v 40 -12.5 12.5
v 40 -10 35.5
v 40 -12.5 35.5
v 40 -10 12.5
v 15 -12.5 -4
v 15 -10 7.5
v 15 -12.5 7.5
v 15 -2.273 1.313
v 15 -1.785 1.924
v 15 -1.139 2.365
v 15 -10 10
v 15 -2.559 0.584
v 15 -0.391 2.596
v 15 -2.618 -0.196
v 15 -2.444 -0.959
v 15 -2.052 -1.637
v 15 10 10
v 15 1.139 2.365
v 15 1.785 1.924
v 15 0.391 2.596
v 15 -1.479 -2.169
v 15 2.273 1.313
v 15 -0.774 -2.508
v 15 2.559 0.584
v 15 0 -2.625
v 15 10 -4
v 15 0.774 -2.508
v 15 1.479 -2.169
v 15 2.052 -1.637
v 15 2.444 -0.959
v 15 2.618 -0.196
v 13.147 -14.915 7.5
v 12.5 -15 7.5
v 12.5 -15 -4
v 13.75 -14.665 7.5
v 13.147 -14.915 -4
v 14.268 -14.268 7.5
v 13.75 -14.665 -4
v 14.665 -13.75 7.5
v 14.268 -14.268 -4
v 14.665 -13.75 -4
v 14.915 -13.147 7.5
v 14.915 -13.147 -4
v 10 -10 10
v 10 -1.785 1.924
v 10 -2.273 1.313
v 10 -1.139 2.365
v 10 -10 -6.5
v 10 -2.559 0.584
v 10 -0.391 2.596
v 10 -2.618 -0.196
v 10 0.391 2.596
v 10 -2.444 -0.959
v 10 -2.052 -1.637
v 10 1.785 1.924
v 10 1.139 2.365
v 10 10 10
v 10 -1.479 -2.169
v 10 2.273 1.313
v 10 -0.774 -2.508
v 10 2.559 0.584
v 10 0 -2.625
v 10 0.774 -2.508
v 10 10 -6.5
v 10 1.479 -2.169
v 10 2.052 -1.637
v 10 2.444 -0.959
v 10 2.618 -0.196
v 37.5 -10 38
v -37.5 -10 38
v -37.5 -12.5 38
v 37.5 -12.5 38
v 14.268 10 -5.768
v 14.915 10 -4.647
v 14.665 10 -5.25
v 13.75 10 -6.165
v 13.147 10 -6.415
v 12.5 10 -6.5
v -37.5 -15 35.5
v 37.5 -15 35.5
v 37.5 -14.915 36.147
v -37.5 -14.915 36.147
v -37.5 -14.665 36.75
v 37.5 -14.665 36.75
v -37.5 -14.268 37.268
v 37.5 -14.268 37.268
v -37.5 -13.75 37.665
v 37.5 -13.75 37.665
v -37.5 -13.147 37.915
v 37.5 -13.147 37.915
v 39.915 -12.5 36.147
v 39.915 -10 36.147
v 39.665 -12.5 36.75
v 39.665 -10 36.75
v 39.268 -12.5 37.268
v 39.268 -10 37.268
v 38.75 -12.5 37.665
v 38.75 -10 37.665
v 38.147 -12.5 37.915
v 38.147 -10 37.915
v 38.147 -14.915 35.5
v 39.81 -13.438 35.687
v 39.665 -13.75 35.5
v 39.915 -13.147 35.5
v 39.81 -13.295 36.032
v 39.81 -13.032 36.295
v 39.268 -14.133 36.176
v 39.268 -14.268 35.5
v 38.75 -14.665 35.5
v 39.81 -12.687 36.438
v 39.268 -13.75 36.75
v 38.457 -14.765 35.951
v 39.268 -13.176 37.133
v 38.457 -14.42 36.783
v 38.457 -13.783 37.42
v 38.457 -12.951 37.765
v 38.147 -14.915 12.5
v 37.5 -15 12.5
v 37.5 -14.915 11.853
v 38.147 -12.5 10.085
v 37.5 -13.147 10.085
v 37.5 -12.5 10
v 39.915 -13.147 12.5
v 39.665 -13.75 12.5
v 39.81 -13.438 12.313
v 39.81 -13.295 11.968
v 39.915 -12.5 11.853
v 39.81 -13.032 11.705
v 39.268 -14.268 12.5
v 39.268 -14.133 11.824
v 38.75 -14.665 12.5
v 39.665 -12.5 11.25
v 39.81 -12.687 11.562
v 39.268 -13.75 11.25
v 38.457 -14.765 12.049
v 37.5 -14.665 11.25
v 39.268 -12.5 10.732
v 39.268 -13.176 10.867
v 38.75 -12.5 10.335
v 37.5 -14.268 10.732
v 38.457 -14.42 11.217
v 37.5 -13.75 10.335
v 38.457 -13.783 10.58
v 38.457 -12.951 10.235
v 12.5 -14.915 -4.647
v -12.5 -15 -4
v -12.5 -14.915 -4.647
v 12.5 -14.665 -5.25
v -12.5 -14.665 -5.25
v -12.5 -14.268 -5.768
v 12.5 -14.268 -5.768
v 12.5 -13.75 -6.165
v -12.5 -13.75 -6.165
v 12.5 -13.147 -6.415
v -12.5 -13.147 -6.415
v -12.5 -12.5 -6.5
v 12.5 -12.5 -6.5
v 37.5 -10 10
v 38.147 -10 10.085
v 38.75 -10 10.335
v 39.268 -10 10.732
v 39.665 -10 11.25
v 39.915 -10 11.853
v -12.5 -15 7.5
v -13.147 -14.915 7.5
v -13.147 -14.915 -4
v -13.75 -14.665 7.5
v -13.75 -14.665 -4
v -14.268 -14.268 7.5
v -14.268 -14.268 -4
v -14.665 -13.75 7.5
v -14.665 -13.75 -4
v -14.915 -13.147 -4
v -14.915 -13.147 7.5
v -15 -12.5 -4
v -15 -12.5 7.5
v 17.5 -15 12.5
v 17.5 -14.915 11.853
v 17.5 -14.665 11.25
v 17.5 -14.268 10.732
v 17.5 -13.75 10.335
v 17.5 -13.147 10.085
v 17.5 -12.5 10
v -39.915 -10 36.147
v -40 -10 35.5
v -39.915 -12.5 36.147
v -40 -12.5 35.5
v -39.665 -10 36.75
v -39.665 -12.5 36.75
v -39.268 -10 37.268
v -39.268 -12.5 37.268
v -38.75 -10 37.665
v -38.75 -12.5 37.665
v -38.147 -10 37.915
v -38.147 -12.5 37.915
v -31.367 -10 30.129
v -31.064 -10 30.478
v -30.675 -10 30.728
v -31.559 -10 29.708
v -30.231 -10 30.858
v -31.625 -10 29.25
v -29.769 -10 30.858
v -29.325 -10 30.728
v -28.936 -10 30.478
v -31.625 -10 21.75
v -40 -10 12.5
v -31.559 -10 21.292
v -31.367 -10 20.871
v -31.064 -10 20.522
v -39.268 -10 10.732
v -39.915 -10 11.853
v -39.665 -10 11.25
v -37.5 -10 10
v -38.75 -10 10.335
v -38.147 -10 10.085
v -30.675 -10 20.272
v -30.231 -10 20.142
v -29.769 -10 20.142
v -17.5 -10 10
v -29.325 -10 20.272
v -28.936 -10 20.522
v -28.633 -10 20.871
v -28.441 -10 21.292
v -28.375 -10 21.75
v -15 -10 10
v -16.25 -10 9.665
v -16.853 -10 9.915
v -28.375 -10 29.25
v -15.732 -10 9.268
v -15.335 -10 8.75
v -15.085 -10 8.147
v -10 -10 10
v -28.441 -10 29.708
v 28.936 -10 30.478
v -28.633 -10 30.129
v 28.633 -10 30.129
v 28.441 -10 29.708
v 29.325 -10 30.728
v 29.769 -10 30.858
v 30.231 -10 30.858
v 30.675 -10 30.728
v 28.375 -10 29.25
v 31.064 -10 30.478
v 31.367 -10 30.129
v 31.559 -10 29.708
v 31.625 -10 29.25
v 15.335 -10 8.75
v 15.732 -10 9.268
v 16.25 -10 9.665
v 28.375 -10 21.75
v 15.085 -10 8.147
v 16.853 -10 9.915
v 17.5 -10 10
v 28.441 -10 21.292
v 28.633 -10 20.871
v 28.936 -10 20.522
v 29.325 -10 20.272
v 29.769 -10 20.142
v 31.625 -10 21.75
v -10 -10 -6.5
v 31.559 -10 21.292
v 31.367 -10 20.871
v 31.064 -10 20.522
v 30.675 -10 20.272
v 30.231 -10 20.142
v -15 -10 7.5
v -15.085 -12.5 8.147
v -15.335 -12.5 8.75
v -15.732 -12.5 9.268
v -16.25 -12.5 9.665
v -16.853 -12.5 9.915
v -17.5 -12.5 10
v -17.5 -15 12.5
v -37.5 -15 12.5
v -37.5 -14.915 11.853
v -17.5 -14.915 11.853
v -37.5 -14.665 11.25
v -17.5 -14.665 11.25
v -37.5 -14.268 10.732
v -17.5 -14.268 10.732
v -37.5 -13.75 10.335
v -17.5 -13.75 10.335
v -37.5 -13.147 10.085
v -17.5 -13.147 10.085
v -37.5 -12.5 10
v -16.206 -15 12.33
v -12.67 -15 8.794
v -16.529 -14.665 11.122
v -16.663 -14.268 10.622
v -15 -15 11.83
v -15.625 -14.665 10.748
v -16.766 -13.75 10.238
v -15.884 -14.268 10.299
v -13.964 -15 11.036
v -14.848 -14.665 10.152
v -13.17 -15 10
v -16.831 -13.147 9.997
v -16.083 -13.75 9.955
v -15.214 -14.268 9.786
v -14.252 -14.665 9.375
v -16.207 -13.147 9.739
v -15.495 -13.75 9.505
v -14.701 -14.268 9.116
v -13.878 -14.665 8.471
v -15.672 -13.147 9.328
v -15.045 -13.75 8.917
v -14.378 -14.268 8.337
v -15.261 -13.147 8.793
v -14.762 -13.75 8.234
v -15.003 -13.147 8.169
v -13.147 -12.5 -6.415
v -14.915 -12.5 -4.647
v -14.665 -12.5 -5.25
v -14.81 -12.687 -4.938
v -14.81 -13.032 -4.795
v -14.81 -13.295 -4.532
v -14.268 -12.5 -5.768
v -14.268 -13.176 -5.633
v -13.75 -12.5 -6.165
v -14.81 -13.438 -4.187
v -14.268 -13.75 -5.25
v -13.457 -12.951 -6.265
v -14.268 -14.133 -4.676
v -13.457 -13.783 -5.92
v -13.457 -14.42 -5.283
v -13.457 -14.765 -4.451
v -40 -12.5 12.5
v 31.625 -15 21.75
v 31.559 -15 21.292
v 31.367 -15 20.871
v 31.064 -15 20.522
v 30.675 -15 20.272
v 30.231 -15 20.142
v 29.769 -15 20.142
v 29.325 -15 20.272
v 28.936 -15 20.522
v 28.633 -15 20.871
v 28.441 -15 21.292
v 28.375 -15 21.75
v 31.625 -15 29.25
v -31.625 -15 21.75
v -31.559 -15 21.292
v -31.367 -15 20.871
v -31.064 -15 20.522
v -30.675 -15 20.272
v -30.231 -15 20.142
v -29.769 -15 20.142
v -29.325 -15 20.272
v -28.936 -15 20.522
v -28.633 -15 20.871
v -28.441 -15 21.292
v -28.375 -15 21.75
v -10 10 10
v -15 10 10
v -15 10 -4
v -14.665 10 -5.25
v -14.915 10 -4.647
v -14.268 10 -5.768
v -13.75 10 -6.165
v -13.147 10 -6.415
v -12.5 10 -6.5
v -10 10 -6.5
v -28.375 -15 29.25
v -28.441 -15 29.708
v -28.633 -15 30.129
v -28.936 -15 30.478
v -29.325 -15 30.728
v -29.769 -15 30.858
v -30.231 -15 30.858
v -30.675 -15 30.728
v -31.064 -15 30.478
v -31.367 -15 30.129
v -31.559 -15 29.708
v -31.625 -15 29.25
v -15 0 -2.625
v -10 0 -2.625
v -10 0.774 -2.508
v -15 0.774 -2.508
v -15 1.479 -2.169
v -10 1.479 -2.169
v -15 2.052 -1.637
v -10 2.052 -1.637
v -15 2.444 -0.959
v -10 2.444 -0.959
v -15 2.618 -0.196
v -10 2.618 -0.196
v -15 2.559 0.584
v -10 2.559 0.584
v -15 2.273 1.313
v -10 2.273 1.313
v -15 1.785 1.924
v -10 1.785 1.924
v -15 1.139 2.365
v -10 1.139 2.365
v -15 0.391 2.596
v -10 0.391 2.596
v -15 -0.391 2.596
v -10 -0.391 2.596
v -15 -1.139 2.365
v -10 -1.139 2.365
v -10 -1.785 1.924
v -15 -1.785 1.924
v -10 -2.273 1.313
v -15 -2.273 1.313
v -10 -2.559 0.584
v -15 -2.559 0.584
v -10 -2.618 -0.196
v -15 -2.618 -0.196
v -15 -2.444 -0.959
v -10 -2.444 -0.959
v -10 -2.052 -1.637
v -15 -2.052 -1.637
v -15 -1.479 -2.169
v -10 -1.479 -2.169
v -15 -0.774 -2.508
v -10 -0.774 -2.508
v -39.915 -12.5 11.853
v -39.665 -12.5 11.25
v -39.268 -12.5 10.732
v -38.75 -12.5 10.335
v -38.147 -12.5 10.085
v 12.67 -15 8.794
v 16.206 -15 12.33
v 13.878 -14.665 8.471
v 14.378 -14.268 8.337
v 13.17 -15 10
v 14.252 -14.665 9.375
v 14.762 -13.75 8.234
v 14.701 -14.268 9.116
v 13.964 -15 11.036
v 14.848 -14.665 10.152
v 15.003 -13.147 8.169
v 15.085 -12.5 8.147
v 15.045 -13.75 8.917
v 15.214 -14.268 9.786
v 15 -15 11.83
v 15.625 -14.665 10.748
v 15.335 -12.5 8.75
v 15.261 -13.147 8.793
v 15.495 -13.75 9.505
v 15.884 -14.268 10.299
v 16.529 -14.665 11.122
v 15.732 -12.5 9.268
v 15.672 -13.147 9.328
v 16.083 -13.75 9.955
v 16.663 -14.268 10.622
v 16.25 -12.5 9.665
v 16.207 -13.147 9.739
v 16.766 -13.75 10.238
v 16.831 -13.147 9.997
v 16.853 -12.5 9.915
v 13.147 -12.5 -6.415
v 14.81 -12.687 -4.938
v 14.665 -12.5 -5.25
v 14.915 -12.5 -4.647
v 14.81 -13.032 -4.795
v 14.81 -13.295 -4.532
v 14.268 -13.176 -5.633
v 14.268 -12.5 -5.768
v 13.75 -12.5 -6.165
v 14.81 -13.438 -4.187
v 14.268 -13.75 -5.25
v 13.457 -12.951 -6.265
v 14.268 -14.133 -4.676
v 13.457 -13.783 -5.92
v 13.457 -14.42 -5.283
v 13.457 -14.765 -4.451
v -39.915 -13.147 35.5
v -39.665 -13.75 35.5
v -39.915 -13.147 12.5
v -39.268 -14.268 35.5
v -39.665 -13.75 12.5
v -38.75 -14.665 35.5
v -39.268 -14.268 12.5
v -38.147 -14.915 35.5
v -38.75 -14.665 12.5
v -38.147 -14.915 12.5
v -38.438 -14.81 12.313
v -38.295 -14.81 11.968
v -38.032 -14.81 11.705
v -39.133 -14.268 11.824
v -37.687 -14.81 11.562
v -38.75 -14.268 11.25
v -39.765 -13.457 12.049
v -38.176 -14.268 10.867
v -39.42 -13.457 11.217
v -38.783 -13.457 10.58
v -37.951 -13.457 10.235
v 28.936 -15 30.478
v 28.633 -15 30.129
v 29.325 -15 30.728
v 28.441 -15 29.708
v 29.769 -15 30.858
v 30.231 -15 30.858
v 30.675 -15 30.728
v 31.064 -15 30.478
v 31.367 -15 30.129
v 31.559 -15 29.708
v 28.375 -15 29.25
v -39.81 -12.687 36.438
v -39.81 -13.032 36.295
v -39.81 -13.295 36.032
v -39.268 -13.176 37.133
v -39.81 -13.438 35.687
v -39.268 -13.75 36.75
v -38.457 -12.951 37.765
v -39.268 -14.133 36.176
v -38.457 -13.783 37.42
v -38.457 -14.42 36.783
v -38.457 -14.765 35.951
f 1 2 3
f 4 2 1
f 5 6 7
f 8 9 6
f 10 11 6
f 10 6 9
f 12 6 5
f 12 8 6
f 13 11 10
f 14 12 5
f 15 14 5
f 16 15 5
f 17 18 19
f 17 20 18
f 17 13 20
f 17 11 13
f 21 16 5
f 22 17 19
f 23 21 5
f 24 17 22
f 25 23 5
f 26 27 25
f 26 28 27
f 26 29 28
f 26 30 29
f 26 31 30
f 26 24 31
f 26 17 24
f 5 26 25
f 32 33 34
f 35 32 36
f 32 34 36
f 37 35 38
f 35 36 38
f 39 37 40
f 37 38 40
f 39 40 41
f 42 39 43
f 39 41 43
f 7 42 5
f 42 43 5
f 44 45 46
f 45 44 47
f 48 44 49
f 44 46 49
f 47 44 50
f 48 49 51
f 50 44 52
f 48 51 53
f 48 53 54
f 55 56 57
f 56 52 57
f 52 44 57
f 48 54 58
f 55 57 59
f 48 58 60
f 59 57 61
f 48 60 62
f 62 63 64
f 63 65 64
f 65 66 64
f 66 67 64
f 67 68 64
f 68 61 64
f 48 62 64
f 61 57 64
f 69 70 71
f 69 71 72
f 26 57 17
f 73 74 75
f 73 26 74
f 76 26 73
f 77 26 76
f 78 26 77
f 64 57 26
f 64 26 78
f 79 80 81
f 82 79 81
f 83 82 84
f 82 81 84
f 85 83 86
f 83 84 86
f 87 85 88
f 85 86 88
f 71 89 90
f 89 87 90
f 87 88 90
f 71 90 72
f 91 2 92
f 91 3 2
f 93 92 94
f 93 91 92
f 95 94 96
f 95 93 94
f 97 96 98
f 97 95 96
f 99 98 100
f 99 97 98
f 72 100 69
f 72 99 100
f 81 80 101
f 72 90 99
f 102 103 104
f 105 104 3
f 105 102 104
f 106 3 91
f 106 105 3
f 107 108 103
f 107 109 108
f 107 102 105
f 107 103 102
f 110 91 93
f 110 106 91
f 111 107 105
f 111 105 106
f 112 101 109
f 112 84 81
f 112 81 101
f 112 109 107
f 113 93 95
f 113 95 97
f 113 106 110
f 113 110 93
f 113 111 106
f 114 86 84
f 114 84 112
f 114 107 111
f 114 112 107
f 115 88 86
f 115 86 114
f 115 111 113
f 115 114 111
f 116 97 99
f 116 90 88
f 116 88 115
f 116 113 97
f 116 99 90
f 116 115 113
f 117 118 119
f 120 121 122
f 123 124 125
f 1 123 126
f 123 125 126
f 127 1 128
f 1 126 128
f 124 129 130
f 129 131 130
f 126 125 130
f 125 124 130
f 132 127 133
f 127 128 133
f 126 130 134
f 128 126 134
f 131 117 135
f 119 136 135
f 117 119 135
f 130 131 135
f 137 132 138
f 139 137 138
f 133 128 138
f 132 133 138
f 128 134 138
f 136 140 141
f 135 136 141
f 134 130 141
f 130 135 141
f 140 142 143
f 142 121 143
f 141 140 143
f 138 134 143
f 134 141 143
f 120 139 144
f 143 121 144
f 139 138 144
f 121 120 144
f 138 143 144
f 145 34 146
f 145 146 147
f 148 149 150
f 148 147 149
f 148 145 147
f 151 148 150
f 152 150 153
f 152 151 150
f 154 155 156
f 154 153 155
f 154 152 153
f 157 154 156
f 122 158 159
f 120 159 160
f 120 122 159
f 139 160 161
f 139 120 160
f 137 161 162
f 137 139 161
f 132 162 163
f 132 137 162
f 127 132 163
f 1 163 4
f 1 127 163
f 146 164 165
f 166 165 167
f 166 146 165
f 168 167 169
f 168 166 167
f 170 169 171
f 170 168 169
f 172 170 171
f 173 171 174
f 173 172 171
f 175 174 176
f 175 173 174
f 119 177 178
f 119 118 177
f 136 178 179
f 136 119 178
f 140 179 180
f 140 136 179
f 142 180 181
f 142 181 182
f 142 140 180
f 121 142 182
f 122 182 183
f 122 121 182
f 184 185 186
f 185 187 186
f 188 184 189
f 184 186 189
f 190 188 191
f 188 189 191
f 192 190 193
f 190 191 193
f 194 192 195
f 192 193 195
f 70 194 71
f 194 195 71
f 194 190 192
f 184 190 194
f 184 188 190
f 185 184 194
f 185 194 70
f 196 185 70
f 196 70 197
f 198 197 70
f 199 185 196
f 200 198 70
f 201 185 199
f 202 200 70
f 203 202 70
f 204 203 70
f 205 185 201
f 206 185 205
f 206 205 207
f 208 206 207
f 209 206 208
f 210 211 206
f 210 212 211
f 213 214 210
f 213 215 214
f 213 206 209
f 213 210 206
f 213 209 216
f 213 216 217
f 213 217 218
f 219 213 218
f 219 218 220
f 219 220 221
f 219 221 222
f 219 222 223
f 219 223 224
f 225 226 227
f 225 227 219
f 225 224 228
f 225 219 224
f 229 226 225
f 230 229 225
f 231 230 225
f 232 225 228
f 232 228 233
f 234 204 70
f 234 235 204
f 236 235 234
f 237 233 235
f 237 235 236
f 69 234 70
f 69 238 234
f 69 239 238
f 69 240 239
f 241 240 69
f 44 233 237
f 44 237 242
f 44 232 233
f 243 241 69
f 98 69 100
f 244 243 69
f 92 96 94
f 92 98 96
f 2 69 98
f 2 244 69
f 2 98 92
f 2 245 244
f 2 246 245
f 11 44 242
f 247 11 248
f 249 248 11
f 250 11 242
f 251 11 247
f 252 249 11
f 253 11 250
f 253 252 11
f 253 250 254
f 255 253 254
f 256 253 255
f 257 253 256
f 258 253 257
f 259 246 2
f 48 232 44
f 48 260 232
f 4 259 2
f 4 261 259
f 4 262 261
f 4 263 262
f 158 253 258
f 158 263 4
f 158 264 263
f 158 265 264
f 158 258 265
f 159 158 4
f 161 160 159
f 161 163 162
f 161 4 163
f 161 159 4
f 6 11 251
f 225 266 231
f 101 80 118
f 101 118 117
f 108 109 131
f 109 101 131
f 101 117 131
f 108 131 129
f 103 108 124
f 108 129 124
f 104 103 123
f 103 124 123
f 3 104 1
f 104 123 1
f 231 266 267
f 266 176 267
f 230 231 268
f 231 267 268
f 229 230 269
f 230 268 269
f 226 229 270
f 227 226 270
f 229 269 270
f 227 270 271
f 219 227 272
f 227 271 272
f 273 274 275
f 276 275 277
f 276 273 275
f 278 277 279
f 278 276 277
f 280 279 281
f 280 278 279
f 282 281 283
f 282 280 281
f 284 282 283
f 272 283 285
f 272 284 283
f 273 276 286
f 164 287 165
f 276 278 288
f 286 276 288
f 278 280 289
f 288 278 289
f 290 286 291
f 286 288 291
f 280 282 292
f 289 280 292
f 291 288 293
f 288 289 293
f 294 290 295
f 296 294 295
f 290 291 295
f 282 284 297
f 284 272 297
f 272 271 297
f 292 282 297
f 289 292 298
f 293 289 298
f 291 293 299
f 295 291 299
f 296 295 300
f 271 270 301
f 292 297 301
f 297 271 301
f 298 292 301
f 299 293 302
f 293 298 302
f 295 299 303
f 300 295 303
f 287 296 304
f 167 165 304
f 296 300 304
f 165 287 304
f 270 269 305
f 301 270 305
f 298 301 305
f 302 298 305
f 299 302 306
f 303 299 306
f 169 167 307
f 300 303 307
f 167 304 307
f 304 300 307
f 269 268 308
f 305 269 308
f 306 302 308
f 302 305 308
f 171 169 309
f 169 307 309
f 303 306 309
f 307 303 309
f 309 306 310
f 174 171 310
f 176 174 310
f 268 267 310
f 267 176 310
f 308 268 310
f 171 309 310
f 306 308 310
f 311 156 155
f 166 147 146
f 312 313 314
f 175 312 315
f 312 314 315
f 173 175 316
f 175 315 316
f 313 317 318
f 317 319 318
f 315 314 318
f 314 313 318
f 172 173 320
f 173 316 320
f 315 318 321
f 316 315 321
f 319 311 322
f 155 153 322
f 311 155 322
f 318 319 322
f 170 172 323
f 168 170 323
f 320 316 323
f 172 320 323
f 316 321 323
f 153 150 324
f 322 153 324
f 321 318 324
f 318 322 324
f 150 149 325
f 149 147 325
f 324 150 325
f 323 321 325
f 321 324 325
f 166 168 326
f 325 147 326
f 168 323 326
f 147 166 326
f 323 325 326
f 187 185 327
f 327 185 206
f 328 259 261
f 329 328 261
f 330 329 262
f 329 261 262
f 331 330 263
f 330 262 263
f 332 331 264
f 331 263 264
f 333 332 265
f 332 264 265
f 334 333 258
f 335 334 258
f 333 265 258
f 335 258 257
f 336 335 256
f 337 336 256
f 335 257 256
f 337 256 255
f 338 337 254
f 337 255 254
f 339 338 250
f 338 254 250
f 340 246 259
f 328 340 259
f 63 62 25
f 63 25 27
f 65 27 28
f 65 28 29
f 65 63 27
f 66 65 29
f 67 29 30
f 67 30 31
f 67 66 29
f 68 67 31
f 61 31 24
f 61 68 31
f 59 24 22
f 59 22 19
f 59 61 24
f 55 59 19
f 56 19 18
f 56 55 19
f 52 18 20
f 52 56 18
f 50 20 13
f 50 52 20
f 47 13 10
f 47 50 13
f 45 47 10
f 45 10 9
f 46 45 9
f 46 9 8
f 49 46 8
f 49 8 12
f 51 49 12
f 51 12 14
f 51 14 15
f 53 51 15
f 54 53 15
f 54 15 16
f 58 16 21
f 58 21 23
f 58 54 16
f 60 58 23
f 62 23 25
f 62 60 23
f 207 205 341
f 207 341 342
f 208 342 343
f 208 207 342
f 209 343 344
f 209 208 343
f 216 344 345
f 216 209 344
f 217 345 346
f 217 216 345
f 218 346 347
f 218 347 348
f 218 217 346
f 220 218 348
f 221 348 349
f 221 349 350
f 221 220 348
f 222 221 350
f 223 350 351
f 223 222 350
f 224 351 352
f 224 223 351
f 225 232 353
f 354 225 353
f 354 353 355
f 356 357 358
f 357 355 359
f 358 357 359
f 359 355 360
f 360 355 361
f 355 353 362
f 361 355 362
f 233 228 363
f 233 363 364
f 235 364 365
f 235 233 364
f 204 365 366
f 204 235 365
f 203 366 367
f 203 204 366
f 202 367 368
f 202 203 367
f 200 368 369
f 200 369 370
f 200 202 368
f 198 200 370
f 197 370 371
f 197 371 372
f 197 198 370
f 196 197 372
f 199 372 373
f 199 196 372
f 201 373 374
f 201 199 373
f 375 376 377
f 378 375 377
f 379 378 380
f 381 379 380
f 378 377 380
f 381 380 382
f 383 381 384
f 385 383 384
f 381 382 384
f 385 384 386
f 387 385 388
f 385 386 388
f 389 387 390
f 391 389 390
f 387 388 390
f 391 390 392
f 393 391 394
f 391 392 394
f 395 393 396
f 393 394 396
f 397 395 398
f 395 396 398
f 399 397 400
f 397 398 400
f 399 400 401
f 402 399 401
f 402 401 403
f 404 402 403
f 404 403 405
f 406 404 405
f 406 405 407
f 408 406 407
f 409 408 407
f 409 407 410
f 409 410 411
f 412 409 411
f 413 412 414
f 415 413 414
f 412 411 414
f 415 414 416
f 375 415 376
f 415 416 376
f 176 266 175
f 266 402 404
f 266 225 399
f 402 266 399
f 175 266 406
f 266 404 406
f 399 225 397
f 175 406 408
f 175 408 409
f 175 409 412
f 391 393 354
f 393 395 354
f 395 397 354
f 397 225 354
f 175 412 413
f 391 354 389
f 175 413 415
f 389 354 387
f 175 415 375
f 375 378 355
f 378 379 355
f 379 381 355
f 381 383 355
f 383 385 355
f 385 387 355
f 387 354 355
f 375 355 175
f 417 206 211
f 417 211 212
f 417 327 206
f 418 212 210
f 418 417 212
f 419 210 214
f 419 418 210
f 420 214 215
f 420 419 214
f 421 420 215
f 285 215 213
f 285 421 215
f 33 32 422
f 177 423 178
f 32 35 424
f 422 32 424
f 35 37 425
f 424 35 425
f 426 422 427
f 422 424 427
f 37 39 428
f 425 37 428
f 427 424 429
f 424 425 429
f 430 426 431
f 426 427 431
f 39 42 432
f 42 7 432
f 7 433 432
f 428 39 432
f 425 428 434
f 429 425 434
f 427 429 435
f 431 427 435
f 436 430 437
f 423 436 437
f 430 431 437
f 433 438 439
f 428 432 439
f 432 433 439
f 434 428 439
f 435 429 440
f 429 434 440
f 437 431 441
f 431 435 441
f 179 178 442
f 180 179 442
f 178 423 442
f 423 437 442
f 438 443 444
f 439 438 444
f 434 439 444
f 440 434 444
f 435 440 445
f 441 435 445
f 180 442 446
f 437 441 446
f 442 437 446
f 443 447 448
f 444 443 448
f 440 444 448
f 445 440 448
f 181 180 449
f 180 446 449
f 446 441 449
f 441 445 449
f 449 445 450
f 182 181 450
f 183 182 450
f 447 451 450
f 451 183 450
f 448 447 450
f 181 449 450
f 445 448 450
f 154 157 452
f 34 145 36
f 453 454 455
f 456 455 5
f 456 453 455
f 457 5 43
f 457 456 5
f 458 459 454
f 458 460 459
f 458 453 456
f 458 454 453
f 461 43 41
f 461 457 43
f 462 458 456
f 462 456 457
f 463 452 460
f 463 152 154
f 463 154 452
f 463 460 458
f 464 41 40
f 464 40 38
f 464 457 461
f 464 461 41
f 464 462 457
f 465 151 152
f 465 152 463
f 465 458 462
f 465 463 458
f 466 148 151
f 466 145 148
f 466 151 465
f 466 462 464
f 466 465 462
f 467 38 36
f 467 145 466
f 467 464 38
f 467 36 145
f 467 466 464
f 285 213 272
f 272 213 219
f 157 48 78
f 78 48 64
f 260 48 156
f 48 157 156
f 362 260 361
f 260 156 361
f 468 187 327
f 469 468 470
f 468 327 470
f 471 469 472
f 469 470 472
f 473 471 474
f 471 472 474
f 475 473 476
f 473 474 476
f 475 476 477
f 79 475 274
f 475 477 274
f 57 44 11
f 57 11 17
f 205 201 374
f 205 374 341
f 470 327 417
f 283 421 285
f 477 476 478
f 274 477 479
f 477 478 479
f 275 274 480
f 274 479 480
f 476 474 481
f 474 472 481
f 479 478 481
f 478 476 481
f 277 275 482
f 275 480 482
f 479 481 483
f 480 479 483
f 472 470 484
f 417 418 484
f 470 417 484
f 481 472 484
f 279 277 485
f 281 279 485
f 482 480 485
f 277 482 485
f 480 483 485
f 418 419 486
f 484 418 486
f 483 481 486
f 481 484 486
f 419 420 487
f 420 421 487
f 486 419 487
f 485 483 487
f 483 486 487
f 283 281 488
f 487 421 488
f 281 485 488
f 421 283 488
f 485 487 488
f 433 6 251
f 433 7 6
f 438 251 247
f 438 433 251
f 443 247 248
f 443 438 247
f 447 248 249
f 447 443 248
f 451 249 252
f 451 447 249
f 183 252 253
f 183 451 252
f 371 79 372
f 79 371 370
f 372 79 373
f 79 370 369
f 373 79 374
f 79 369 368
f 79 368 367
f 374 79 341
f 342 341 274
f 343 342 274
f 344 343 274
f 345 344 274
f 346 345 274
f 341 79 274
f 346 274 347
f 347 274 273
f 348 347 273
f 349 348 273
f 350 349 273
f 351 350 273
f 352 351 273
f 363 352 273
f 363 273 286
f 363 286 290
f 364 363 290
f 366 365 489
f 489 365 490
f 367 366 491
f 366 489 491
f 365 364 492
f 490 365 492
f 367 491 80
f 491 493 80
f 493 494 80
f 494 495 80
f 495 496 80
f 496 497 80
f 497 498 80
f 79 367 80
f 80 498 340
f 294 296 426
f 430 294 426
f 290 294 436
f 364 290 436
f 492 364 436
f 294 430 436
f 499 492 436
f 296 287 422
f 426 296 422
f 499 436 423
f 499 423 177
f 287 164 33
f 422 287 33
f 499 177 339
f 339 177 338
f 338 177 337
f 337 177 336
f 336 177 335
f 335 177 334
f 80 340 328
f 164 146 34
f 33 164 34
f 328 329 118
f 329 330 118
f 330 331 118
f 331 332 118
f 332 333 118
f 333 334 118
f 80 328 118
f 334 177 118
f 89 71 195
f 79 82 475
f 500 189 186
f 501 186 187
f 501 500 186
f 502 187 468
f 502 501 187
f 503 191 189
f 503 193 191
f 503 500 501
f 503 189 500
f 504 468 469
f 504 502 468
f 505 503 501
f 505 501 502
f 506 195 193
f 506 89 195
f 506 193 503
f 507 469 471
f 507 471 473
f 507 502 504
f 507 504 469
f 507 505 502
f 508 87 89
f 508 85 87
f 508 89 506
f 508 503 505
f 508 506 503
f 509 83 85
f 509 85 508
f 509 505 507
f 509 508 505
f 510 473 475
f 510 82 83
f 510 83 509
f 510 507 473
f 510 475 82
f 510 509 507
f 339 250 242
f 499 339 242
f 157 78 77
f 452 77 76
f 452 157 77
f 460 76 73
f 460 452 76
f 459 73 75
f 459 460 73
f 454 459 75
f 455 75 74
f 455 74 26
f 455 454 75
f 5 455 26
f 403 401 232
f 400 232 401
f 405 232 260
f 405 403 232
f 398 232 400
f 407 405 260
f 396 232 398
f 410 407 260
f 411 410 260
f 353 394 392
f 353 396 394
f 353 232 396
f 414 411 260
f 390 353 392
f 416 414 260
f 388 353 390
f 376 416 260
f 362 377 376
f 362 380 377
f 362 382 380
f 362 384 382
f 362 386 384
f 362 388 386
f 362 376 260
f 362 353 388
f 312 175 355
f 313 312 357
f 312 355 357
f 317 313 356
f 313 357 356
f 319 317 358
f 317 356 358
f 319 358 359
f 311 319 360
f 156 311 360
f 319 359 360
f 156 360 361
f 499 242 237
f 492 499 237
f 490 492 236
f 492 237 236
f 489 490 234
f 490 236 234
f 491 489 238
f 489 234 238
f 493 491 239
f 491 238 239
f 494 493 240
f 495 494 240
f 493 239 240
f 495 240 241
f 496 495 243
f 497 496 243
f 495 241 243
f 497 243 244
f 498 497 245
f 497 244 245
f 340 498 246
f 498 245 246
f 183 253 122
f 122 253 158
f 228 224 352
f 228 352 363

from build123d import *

# Parameters (mm, degrees)
BOSS_EXTRUDE1_START = 10
SKETCH1_W           = 16.5
SKETCH1_H           = 20
SKETCH1_R           = 2.625
BOSS_EXTRUDE1_DEPTH = 5
BOSS_EXTRUDE2_START = -10
SKETCH1_3_W         = 16.5
SKETCH1_3_H         = 20
SKETCH1_3_R         = 2.625
BOSS_EXTRUDE2_DEPTH = 5
BOSS_EXTRUDE3_START = -15
SKETCH1_4_W         = 16.5
SKETCH1_4_H         = 5
SKETCH1_4_W_2       = 28
BOSS_EXTRUDE3_DEPTH = 30
SKETCH2_W           = 25
SKETCH2_H           = 28
BOSS_EXTRUDE4_DEPTH = 5
FILLET1_R           = 2.5


with BuildPart() as part:
    # Sketch1 → Boss-Extrude1 (new body)
    with BuildSketch(Plane(origin=(0, 0, 0), x_dir=(0, 0, -1), z_dir=(1, 0, 0)).offset(BOSS_EXTRUDE1_START)):
        with Locations((-1.75, 0)):
            Rectangle(SKETCH1_W, SKETCH1_H)
        Circle(SKETCH1_R, mode=Mode.SUBTRACT)
    extrude(amount=BOSS_EXTRUDE1_DEPTH)



with BuildPart() as body_2:
    # Sketch1<3> → Boss-Extrude2 (new body)
    with BuildSketch(Plane(origin=(0, 0, 0), x_dir=(0, 0, -1), z_dir=(1, 0, 0)).offset(BOSS_EXTRUDE2_START)):
        with Locations((-1.75, 0)):
            Rectangle(SKETCH1_3_W, SKETCH1_3_H)
        Circle(SKETCH1_3_R, mode=Mode.SUBTRACT)
    extrude(amount=-BOSS_EXTRUDE2_DEPTH)


with BuildPart() as part_1:
    add(part.part)

    add(body_2.part)  # Boss-Extrude3 merges body 2
    # Sketch1<4> → Boss-Extrude3 (add)
    with BuildSketch(Plane(origin=(0, 0, 0), x_dir=(0, 0, -1), z_dir=(1, 0, 0)).offset(BOSS_EXTRUDE3_START)):
        with Locations((-1.75, -12.5)):
            Rectangle(SKETCH1_4_W, SKETCH1_4_H)
        with Locations((-24, -12.5)):
            Rectangle(SKETCH1_4_W_2, SKETCH1_4_H)
    extrude(amount=BOSS_EXTRUDE3_DEPTH)

    # Sketch2 → Boss-Extrude4 (add)
    with BuildSketch(Plane(origin=(0, -10, 0), x_dir=(1, 0, 0), z_dir=(0, 1, 0))):
        with Locations((-27.5, -24)):
            Rectangle(SKETCH2_W, SKETCH2_H)
        with BuildLine():
            Line((-31.625, -29.25), (-31.625, -21.75))
            ThreePointArc((-31.625, -21.75), (-30, -20.125), (-28.375, -21.75))
            Line((-28.375, -21.75), (-28.375, -29.25))
            ThreePointArc((-28.375, -29.25), (-30, -30.875), (-31.625, -29.25))
        make_face(mode=Mode.SUBTRACT)
        with Locations((27.5, -24)):
            Rectangle(SKETCH2_W, SKETCH2_H)
        with BuildLine():
            Line((31.625, -29.25), (31.625, -21.75))
            ThreePointArc((31.625, -21.75), (30, -20.125), (28.375, -21.75))
            Line((28.375, -21.75), (28.375, -29.25))
            ThreePointArc((28.375, -29.25), (30, -30.875), (31.625, -29.25))
        make_face(mode=Mode.SUBTRACT)
    extrude(amount=-BOSS_EXTRUDE4_DEPTH)

    # Fillet1
    fillet1_edges = [part_1.edges().sort_by_distance(p)[0] for p in [
        (0, -15, -6.5),
        (-15, -2.5, -6.5),
        (0, -15, 38),
        (-15, -15, 1.75),
        (15, -2.5, -6.5),
        (15, -15, 1.75),
        (-40, -12.5, 38),
        (-40, -12.5, 10),
        (-15, -12.5, 10),
        (-40, -15, 24),
        (-27.5, -15, 10),
        (27.5, -15, 10),
        (15, -12.5, 10),
        (40, -15, 24),
        (40, -12.5, 10),
        (40, -12.5, 38),
    ]]
    fillet(fillet1_edges, radius=FILLET1_R)


solid = part_1.part
